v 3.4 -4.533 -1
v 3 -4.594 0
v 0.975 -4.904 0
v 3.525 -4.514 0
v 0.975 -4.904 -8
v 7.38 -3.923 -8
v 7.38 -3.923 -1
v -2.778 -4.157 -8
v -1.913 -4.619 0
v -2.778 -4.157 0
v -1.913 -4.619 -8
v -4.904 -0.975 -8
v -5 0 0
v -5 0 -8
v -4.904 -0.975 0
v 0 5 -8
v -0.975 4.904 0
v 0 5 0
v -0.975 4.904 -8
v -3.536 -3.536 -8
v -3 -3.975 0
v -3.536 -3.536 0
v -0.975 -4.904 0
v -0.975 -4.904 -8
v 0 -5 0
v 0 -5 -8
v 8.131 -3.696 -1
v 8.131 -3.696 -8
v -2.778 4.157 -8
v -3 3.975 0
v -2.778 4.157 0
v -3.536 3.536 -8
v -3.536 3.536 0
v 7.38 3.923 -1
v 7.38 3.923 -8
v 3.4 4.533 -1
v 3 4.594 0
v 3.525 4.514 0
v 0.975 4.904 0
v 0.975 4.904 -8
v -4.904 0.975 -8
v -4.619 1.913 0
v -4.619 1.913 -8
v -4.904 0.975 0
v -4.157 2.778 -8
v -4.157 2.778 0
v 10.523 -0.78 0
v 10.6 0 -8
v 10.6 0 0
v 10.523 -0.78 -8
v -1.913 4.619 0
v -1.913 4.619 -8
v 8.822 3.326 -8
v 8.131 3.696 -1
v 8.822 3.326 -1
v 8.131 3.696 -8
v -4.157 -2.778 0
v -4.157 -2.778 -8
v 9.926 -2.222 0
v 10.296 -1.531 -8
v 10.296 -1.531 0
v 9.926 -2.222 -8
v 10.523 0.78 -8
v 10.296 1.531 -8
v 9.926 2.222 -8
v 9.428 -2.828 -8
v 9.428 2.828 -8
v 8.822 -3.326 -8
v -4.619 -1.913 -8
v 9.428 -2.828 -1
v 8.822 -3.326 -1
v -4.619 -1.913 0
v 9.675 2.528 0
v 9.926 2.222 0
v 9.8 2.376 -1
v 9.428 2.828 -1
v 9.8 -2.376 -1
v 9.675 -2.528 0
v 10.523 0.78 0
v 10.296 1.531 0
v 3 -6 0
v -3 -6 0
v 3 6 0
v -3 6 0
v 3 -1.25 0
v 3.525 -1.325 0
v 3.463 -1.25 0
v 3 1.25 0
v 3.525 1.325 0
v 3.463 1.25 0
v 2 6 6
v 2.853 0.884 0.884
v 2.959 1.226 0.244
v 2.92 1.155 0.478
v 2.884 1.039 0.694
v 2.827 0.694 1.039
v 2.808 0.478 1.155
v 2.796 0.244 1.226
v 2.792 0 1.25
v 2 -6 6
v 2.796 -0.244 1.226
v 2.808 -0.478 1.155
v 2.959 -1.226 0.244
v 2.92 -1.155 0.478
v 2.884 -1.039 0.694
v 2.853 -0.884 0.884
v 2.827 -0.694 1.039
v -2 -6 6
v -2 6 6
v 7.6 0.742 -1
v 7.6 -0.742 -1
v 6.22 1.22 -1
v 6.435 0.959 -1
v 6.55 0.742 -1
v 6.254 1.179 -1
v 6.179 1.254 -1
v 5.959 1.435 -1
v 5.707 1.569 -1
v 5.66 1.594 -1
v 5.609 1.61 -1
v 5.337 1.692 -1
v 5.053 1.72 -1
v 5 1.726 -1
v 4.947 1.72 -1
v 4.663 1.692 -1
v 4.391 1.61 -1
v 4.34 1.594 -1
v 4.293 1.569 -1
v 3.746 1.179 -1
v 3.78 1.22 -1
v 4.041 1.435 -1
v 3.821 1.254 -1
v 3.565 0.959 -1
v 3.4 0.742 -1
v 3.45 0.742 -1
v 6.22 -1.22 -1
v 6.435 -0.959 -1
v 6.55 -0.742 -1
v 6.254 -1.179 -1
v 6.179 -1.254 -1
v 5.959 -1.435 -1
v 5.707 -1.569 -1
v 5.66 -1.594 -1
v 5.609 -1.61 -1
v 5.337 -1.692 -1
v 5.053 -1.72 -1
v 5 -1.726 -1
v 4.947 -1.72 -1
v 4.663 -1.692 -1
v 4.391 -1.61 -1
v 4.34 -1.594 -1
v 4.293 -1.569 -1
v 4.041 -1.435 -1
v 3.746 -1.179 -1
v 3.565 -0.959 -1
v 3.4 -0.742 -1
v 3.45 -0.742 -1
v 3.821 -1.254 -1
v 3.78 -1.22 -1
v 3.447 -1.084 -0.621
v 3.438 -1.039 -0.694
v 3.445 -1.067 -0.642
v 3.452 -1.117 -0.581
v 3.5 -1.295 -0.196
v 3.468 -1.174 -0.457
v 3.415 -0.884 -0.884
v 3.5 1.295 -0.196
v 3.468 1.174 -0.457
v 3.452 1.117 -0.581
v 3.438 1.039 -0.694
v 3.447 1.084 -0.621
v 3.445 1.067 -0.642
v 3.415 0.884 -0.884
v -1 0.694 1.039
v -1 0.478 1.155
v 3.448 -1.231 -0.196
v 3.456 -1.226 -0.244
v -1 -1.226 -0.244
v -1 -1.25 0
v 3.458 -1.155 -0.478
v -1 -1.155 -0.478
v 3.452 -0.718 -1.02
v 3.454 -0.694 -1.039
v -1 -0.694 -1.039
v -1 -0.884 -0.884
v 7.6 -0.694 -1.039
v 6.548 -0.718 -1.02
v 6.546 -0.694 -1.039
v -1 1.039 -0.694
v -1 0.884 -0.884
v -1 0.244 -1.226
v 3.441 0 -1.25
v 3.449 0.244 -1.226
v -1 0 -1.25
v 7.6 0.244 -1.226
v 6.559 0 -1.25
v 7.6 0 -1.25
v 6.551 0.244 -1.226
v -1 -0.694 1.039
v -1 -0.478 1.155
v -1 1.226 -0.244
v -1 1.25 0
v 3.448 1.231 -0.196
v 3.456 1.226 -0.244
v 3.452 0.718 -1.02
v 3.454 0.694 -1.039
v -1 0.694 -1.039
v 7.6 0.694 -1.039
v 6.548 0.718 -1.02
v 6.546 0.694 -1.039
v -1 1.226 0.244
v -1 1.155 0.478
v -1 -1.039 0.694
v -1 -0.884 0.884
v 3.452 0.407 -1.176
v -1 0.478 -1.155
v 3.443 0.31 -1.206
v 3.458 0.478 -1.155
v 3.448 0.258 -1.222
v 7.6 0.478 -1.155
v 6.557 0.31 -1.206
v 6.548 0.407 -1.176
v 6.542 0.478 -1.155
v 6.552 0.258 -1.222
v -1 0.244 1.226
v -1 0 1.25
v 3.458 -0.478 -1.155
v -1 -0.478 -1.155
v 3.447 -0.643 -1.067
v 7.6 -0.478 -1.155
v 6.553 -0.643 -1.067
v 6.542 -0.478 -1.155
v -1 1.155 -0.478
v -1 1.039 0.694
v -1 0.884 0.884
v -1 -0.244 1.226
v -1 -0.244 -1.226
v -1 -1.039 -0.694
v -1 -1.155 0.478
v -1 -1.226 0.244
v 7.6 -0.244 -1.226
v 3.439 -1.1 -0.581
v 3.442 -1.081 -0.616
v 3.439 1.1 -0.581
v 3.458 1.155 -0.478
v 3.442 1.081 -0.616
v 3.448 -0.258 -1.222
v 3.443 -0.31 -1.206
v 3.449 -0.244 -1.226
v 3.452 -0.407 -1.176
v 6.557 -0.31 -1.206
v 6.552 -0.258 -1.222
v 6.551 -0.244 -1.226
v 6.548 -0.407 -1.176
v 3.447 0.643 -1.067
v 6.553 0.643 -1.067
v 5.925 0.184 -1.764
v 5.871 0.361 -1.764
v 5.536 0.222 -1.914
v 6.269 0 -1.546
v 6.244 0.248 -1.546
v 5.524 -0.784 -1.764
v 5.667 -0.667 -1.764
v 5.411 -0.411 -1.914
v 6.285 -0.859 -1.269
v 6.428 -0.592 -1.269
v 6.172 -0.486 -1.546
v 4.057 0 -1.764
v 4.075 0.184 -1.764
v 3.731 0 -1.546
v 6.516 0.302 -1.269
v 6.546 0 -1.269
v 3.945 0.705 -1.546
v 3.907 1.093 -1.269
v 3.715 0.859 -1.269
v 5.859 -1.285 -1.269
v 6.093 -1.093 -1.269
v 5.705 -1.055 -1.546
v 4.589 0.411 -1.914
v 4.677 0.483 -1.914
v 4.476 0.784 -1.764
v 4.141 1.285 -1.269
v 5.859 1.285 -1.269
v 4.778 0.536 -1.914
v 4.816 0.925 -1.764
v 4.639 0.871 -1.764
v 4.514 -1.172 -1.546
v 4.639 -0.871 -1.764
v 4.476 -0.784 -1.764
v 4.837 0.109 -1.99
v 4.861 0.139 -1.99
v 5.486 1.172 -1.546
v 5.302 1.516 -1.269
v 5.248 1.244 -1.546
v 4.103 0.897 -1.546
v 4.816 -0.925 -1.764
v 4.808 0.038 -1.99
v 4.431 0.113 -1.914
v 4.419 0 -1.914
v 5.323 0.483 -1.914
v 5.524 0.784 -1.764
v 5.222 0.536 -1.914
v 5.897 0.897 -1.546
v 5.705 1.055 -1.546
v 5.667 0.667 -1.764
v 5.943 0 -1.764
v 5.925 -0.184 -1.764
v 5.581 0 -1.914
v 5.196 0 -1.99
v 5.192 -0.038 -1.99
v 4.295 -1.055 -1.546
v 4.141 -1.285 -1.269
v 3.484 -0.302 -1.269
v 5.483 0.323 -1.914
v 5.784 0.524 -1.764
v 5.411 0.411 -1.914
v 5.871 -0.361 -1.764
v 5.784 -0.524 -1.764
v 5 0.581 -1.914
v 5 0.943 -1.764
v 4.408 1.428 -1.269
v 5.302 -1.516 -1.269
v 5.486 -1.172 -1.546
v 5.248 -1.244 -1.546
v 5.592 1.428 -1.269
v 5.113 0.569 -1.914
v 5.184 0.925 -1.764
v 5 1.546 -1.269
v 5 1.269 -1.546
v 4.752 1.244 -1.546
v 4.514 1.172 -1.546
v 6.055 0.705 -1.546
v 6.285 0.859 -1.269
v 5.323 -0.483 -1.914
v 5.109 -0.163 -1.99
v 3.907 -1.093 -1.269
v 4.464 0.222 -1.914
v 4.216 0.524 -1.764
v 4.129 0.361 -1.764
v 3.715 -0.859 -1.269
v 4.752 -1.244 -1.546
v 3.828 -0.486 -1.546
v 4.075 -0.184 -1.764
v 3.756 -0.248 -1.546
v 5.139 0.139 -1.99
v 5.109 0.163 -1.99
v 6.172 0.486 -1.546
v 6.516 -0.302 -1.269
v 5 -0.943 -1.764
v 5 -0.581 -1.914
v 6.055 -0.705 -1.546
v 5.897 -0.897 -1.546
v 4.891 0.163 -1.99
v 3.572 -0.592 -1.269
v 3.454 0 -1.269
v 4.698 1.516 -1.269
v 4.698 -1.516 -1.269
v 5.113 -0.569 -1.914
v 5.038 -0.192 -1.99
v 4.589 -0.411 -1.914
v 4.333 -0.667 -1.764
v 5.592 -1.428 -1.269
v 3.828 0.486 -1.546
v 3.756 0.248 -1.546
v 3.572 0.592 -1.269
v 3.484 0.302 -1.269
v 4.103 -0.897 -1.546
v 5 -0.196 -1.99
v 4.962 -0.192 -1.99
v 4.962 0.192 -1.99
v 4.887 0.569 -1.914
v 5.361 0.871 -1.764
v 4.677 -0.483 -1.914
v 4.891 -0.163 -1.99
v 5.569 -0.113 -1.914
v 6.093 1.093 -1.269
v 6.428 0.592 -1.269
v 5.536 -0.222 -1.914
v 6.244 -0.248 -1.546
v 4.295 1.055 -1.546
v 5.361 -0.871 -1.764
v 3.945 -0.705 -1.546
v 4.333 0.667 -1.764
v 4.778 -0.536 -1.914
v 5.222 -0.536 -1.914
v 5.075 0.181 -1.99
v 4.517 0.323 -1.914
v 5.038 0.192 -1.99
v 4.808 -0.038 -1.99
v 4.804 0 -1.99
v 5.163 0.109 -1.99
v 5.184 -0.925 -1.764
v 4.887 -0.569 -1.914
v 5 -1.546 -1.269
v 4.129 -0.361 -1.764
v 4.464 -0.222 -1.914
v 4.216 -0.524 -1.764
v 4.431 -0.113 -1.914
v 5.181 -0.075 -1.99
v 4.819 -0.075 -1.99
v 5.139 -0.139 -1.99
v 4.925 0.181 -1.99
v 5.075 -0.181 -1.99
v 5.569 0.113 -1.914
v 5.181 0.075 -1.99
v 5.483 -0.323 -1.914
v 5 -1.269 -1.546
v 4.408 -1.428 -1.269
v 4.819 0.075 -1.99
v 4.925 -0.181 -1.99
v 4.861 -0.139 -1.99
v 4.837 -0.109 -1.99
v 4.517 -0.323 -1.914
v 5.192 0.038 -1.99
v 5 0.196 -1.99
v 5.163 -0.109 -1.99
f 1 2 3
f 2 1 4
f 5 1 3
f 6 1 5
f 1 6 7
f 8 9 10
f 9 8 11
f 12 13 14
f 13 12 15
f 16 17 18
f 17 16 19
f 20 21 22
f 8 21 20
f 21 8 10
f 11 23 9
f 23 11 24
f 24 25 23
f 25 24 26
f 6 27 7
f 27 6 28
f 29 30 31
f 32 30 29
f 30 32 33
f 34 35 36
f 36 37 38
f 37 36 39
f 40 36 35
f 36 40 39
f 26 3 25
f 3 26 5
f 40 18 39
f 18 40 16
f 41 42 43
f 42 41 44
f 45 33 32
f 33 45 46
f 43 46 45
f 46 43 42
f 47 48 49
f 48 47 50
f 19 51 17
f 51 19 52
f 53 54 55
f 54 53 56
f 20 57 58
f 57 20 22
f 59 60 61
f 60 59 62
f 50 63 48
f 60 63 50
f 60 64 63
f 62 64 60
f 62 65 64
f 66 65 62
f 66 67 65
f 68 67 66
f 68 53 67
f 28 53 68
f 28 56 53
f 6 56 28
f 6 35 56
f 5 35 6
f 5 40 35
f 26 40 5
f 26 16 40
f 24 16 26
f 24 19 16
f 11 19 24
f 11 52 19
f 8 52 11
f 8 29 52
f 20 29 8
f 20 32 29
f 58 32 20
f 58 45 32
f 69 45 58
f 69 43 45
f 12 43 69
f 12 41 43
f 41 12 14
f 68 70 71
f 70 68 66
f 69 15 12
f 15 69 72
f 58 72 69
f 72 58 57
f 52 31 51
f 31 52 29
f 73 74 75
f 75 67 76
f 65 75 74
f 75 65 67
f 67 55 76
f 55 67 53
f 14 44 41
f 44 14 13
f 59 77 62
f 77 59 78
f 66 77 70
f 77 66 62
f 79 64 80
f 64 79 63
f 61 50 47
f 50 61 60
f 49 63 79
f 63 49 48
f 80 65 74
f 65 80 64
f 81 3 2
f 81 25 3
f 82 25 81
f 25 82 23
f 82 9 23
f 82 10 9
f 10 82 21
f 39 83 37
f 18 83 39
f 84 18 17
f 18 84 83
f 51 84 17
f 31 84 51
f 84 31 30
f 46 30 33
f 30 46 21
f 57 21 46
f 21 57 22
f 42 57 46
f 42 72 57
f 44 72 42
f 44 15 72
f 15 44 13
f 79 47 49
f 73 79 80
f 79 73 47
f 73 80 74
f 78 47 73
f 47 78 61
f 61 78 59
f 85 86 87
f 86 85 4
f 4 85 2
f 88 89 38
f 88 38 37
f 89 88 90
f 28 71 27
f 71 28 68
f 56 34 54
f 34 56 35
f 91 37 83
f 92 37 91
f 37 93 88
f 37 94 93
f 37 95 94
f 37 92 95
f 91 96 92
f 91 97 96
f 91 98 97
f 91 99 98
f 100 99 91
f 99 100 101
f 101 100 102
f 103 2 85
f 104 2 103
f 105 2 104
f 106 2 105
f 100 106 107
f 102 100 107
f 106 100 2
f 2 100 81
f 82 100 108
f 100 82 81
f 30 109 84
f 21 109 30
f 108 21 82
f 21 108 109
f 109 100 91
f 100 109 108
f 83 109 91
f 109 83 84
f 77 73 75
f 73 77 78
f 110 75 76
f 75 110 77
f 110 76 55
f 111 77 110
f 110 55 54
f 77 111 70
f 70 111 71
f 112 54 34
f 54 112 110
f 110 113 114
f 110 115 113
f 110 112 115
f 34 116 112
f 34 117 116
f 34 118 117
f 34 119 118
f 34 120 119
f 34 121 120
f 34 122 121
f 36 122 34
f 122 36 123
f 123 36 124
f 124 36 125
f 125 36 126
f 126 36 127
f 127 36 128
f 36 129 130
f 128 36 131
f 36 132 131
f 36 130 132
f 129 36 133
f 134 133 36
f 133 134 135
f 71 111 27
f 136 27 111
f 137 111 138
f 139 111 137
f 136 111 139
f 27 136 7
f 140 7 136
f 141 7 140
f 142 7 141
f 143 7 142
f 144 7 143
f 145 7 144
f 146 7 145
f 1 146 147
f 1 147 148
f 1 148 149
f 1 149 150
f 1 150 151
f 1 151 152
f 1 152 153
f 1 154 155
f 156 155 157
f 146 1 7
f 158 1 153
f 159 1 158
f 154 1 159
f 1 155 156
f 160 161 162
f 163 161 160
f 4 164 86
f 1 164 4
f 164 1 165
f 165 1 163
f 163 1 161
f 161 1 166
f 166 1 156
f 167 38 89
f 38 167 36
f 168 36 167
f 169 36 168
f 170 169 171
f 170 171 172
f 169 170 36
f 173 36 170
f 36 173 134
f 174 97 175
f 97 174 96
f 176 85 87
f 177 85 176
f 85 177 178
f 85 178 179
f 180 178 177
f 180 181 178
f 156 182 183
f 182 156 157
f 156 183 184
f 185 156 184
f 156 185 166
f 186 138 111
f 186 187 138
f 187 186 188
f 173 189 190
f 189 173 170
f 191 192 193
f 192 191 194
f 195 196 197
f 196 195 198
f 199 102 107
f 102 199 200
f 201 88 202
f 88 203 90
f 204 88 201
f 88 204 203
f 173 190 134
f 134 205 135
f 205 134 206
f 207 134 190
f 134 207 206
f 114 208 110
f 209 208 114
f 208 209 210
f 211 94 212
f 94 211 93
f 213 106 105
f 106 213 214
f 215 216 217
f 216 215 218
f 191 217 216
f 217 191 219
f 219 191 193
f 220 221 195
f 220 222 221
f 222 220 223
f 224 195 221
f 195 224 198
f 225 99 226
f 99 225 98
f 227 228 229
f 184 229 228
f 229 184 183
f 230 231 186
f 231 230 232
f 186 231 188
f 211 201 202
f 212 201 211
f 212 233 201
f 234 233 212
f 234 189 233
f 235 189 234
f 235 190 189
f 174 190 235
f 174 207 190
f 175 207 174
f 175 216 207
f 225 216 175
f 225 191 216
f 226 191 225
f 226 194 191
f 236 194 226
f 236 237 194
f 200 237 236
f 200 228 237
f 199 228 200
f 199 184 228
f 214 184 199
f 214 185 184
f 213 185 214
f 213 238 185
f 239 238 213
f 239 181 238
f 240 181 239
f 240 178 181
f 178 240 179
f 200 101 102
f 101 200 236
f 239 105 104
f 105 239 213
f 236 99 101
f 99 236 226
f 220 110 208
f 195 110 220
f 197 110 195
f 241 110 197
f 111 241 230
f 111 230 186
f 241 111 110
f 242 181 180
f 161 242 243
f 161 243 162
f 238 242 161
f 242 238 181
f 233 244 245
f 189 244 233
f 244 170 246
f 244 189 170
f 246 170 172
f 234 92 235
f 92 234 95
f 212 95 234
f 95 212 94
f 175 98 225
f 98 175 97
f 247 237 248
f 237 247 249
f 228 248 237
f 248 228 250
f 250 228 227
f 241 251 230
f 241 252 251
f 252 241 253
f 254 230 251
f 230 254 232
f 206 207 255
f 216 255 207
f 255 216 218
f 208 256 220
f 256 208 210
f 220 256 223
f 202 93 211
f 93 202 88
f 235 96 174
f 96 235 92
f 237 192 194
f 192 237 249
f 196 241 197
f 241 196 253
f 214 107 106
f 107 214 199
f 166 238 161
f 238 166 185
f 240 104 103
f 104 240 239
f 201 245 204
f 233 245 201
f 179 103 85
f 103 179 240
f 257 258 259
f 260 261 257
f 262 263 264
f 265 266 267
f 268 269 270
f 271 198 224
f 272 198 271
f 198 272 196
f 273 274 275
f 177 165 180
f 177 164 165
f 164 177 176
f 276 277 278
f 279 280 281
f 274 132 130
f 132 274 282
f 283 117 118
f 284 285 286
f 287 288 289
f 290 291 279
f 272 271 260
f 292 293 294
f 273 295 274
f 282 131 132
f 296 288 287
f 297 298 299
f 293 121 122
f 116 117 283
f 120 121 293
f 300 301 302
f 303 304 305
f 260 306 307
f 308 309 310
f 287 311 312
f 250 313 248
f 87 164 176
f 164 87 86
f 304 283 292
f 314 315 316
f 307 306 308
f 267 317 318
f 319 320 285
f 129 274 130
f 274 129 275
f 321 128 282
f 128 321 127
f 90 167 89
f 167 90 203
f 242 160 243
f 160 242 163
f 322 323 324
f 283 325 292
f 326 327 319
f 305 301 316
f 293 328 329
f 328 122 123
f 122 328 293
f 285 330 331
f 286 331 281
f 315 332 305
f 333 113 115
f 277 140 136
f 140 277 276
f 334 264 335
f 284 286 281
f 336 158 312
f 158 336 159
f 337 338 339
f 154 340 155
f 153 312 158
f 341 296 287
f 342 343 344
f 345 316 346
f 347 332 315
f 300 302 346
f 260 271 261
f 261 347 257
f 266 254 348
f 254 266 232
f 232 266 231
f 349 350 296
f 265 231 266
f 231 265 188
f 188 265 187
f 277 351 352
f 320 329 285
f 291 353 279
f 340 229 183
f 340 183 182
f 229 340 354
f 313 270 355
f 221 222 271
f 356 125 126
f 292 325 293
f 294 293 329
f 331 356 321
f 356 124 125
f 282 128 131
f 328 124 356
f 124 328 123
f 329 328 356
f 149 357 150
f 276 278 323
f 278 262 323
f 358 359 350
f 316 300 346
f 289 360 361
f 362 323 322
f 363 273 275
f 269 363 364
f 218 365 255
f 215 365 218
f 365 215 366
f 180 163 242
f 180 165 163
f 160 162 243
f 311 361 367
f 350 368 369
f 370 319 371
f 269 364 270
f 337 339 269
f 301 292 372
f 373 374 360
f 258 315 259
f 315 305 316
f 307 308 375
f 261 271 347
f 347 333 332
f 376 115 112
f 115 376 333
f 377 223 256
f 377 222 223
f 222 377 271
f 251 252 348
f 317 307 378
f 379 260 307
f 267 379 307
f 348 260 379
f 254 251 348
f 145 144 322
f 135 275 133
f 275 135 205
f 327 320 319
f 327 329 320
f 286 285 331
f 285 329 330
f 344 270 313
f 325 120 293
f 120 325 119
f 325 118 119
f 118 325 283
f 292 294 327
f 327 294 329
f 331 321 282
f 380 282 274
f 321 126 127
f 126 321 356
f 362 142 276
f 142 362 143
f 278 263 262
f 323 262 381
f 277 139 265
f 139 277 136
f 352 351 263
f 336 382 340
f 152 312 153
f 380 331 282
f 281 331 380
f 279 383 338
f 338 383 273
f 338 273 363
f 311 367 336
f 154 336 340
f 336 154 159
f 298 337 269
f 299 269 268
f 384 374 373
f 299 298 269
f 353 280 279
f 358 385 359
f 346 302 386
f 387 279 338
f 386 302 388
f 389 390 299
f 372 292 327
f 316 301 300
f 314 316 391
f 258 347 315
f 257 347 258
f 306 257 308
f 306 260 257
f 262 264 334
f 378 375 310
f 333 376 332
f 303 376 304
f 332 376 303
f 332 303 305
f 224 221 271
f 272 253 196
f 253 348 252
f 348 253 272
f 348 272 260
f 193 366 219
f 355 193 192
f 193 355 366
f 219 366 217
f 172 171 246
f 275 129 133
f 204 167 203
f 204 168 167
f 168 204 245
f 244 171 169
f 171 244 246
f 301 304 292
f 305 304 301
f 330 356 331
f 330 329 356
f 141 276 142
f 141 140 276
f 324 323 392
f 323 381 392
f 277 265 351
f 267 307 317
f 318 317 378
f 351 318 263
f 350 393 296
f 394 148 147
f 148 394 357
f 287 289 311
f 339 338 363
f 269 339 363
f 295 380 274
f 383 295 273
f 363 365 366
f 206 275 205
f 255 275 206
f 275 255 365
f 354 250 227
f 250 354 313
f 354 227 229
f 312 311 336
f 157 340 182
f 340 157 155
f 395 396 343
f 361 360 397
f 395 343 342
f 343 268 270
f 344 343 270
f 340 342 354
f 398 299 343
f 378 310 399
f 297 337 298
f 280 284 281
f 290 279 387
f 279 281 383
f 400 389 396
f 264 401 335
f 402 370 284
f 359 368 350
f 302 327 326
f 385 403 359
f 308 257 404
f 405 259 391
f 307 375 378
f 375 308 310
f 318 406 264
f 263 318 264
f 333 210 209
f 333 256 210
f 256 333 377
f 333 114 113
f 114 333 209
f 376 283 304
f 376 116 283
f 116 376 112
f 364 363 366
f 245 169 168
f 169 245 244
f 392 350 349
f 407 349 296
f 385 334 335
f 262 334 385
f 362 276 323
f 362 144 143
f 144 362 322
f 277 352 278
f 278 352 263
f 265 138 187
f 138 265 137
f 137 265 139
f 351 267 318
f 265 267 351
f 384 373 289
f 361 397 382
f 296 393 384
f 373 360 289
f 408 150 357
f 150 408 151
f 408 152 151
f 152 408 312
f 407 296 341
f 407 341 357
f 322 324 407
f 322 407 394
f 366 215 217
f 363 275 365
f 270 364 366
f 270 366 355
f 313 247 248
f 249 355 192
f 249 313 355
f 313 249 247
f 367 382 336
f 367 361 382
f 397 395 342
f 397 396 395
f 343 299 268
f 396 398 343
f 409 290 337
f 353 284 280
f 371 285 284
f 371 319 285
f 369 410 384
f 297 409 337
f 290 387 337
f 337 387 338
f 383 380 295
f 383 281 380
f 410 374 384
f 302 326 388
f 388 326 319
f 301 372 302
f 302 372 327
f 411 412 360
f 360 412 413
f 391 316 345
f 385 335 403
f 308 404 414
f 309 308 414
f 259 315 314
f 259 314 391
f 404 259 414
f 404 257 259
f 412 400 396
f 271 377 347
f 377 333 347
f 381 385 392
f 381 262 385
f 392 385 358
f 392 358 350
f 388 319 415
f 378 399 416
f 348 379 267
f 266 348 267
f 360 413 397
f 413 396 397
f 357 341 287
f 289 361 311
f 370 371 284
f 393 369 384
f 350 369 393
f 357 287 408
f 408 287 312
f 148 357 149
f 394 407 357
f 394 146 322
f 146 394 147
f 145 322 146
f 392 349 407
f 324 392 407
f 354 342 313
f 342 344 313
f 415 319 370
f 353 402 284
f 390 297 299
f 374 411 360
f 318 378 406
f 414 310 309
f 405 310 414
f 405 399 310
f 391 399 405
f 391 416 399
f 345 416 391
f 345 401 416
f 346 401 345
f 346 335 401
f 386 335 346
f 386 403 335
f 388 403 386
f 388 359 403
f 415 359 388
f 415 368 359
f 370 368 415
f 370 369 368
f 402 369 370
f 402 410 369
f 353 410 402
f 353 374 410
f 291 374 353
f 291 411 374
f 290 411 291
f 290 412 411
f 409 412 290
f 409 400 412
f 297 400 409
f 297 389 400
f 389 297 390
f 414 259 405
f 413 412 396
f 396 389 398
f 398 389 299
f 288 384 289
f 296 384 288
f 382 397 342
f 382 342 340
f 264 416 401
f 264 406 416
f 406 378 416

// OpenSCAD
// COBRA-Snap Finger Segment - middle
// Dovetail slide joints, no glue needed

$fn = 32;

module finger_segment() {
    difference() {
        union() {
            // Main body
            hull() {
                translate([0, 0, -4])
                cylinder(h=8, d=10, center=true);
                
                translate([6.6000000000000005, 0, -4])
                cylinder(h=8, d=8.0, center=true);
            }
            
            // Male dovetail (proximal end)
            translate([0, 0, 0])
            rotate([90, 0, 0])
            linear_extrude(height=12, center=true)
            polygon(points=[[-3, 0], [3, 0], [2, 6], [-2, 6]]);
        }
        
        // Female dovetail socket (distal end) - skip for distal
        
        translate([6.6000000000000005, 0, 0])
        rotate([90, 0, 0])
        linear_extrude(height=10.0, center=true)
        polygon(points=[[-3.2, -1], [3.2, -1], [2.2, 7], [-2.2, 7]]);
        
        
        // Tendon channel
        translate([3.3000000000000003, 0, 0])
        rotate([0, 90, 0])
        cylinder(h=8.600000000000001, d=2.5, center=true);
        
        // Quick-connect socket for tendon
        translate([5, 0, 0])
        sphere(d=4);
    }
}

finger_segment();
